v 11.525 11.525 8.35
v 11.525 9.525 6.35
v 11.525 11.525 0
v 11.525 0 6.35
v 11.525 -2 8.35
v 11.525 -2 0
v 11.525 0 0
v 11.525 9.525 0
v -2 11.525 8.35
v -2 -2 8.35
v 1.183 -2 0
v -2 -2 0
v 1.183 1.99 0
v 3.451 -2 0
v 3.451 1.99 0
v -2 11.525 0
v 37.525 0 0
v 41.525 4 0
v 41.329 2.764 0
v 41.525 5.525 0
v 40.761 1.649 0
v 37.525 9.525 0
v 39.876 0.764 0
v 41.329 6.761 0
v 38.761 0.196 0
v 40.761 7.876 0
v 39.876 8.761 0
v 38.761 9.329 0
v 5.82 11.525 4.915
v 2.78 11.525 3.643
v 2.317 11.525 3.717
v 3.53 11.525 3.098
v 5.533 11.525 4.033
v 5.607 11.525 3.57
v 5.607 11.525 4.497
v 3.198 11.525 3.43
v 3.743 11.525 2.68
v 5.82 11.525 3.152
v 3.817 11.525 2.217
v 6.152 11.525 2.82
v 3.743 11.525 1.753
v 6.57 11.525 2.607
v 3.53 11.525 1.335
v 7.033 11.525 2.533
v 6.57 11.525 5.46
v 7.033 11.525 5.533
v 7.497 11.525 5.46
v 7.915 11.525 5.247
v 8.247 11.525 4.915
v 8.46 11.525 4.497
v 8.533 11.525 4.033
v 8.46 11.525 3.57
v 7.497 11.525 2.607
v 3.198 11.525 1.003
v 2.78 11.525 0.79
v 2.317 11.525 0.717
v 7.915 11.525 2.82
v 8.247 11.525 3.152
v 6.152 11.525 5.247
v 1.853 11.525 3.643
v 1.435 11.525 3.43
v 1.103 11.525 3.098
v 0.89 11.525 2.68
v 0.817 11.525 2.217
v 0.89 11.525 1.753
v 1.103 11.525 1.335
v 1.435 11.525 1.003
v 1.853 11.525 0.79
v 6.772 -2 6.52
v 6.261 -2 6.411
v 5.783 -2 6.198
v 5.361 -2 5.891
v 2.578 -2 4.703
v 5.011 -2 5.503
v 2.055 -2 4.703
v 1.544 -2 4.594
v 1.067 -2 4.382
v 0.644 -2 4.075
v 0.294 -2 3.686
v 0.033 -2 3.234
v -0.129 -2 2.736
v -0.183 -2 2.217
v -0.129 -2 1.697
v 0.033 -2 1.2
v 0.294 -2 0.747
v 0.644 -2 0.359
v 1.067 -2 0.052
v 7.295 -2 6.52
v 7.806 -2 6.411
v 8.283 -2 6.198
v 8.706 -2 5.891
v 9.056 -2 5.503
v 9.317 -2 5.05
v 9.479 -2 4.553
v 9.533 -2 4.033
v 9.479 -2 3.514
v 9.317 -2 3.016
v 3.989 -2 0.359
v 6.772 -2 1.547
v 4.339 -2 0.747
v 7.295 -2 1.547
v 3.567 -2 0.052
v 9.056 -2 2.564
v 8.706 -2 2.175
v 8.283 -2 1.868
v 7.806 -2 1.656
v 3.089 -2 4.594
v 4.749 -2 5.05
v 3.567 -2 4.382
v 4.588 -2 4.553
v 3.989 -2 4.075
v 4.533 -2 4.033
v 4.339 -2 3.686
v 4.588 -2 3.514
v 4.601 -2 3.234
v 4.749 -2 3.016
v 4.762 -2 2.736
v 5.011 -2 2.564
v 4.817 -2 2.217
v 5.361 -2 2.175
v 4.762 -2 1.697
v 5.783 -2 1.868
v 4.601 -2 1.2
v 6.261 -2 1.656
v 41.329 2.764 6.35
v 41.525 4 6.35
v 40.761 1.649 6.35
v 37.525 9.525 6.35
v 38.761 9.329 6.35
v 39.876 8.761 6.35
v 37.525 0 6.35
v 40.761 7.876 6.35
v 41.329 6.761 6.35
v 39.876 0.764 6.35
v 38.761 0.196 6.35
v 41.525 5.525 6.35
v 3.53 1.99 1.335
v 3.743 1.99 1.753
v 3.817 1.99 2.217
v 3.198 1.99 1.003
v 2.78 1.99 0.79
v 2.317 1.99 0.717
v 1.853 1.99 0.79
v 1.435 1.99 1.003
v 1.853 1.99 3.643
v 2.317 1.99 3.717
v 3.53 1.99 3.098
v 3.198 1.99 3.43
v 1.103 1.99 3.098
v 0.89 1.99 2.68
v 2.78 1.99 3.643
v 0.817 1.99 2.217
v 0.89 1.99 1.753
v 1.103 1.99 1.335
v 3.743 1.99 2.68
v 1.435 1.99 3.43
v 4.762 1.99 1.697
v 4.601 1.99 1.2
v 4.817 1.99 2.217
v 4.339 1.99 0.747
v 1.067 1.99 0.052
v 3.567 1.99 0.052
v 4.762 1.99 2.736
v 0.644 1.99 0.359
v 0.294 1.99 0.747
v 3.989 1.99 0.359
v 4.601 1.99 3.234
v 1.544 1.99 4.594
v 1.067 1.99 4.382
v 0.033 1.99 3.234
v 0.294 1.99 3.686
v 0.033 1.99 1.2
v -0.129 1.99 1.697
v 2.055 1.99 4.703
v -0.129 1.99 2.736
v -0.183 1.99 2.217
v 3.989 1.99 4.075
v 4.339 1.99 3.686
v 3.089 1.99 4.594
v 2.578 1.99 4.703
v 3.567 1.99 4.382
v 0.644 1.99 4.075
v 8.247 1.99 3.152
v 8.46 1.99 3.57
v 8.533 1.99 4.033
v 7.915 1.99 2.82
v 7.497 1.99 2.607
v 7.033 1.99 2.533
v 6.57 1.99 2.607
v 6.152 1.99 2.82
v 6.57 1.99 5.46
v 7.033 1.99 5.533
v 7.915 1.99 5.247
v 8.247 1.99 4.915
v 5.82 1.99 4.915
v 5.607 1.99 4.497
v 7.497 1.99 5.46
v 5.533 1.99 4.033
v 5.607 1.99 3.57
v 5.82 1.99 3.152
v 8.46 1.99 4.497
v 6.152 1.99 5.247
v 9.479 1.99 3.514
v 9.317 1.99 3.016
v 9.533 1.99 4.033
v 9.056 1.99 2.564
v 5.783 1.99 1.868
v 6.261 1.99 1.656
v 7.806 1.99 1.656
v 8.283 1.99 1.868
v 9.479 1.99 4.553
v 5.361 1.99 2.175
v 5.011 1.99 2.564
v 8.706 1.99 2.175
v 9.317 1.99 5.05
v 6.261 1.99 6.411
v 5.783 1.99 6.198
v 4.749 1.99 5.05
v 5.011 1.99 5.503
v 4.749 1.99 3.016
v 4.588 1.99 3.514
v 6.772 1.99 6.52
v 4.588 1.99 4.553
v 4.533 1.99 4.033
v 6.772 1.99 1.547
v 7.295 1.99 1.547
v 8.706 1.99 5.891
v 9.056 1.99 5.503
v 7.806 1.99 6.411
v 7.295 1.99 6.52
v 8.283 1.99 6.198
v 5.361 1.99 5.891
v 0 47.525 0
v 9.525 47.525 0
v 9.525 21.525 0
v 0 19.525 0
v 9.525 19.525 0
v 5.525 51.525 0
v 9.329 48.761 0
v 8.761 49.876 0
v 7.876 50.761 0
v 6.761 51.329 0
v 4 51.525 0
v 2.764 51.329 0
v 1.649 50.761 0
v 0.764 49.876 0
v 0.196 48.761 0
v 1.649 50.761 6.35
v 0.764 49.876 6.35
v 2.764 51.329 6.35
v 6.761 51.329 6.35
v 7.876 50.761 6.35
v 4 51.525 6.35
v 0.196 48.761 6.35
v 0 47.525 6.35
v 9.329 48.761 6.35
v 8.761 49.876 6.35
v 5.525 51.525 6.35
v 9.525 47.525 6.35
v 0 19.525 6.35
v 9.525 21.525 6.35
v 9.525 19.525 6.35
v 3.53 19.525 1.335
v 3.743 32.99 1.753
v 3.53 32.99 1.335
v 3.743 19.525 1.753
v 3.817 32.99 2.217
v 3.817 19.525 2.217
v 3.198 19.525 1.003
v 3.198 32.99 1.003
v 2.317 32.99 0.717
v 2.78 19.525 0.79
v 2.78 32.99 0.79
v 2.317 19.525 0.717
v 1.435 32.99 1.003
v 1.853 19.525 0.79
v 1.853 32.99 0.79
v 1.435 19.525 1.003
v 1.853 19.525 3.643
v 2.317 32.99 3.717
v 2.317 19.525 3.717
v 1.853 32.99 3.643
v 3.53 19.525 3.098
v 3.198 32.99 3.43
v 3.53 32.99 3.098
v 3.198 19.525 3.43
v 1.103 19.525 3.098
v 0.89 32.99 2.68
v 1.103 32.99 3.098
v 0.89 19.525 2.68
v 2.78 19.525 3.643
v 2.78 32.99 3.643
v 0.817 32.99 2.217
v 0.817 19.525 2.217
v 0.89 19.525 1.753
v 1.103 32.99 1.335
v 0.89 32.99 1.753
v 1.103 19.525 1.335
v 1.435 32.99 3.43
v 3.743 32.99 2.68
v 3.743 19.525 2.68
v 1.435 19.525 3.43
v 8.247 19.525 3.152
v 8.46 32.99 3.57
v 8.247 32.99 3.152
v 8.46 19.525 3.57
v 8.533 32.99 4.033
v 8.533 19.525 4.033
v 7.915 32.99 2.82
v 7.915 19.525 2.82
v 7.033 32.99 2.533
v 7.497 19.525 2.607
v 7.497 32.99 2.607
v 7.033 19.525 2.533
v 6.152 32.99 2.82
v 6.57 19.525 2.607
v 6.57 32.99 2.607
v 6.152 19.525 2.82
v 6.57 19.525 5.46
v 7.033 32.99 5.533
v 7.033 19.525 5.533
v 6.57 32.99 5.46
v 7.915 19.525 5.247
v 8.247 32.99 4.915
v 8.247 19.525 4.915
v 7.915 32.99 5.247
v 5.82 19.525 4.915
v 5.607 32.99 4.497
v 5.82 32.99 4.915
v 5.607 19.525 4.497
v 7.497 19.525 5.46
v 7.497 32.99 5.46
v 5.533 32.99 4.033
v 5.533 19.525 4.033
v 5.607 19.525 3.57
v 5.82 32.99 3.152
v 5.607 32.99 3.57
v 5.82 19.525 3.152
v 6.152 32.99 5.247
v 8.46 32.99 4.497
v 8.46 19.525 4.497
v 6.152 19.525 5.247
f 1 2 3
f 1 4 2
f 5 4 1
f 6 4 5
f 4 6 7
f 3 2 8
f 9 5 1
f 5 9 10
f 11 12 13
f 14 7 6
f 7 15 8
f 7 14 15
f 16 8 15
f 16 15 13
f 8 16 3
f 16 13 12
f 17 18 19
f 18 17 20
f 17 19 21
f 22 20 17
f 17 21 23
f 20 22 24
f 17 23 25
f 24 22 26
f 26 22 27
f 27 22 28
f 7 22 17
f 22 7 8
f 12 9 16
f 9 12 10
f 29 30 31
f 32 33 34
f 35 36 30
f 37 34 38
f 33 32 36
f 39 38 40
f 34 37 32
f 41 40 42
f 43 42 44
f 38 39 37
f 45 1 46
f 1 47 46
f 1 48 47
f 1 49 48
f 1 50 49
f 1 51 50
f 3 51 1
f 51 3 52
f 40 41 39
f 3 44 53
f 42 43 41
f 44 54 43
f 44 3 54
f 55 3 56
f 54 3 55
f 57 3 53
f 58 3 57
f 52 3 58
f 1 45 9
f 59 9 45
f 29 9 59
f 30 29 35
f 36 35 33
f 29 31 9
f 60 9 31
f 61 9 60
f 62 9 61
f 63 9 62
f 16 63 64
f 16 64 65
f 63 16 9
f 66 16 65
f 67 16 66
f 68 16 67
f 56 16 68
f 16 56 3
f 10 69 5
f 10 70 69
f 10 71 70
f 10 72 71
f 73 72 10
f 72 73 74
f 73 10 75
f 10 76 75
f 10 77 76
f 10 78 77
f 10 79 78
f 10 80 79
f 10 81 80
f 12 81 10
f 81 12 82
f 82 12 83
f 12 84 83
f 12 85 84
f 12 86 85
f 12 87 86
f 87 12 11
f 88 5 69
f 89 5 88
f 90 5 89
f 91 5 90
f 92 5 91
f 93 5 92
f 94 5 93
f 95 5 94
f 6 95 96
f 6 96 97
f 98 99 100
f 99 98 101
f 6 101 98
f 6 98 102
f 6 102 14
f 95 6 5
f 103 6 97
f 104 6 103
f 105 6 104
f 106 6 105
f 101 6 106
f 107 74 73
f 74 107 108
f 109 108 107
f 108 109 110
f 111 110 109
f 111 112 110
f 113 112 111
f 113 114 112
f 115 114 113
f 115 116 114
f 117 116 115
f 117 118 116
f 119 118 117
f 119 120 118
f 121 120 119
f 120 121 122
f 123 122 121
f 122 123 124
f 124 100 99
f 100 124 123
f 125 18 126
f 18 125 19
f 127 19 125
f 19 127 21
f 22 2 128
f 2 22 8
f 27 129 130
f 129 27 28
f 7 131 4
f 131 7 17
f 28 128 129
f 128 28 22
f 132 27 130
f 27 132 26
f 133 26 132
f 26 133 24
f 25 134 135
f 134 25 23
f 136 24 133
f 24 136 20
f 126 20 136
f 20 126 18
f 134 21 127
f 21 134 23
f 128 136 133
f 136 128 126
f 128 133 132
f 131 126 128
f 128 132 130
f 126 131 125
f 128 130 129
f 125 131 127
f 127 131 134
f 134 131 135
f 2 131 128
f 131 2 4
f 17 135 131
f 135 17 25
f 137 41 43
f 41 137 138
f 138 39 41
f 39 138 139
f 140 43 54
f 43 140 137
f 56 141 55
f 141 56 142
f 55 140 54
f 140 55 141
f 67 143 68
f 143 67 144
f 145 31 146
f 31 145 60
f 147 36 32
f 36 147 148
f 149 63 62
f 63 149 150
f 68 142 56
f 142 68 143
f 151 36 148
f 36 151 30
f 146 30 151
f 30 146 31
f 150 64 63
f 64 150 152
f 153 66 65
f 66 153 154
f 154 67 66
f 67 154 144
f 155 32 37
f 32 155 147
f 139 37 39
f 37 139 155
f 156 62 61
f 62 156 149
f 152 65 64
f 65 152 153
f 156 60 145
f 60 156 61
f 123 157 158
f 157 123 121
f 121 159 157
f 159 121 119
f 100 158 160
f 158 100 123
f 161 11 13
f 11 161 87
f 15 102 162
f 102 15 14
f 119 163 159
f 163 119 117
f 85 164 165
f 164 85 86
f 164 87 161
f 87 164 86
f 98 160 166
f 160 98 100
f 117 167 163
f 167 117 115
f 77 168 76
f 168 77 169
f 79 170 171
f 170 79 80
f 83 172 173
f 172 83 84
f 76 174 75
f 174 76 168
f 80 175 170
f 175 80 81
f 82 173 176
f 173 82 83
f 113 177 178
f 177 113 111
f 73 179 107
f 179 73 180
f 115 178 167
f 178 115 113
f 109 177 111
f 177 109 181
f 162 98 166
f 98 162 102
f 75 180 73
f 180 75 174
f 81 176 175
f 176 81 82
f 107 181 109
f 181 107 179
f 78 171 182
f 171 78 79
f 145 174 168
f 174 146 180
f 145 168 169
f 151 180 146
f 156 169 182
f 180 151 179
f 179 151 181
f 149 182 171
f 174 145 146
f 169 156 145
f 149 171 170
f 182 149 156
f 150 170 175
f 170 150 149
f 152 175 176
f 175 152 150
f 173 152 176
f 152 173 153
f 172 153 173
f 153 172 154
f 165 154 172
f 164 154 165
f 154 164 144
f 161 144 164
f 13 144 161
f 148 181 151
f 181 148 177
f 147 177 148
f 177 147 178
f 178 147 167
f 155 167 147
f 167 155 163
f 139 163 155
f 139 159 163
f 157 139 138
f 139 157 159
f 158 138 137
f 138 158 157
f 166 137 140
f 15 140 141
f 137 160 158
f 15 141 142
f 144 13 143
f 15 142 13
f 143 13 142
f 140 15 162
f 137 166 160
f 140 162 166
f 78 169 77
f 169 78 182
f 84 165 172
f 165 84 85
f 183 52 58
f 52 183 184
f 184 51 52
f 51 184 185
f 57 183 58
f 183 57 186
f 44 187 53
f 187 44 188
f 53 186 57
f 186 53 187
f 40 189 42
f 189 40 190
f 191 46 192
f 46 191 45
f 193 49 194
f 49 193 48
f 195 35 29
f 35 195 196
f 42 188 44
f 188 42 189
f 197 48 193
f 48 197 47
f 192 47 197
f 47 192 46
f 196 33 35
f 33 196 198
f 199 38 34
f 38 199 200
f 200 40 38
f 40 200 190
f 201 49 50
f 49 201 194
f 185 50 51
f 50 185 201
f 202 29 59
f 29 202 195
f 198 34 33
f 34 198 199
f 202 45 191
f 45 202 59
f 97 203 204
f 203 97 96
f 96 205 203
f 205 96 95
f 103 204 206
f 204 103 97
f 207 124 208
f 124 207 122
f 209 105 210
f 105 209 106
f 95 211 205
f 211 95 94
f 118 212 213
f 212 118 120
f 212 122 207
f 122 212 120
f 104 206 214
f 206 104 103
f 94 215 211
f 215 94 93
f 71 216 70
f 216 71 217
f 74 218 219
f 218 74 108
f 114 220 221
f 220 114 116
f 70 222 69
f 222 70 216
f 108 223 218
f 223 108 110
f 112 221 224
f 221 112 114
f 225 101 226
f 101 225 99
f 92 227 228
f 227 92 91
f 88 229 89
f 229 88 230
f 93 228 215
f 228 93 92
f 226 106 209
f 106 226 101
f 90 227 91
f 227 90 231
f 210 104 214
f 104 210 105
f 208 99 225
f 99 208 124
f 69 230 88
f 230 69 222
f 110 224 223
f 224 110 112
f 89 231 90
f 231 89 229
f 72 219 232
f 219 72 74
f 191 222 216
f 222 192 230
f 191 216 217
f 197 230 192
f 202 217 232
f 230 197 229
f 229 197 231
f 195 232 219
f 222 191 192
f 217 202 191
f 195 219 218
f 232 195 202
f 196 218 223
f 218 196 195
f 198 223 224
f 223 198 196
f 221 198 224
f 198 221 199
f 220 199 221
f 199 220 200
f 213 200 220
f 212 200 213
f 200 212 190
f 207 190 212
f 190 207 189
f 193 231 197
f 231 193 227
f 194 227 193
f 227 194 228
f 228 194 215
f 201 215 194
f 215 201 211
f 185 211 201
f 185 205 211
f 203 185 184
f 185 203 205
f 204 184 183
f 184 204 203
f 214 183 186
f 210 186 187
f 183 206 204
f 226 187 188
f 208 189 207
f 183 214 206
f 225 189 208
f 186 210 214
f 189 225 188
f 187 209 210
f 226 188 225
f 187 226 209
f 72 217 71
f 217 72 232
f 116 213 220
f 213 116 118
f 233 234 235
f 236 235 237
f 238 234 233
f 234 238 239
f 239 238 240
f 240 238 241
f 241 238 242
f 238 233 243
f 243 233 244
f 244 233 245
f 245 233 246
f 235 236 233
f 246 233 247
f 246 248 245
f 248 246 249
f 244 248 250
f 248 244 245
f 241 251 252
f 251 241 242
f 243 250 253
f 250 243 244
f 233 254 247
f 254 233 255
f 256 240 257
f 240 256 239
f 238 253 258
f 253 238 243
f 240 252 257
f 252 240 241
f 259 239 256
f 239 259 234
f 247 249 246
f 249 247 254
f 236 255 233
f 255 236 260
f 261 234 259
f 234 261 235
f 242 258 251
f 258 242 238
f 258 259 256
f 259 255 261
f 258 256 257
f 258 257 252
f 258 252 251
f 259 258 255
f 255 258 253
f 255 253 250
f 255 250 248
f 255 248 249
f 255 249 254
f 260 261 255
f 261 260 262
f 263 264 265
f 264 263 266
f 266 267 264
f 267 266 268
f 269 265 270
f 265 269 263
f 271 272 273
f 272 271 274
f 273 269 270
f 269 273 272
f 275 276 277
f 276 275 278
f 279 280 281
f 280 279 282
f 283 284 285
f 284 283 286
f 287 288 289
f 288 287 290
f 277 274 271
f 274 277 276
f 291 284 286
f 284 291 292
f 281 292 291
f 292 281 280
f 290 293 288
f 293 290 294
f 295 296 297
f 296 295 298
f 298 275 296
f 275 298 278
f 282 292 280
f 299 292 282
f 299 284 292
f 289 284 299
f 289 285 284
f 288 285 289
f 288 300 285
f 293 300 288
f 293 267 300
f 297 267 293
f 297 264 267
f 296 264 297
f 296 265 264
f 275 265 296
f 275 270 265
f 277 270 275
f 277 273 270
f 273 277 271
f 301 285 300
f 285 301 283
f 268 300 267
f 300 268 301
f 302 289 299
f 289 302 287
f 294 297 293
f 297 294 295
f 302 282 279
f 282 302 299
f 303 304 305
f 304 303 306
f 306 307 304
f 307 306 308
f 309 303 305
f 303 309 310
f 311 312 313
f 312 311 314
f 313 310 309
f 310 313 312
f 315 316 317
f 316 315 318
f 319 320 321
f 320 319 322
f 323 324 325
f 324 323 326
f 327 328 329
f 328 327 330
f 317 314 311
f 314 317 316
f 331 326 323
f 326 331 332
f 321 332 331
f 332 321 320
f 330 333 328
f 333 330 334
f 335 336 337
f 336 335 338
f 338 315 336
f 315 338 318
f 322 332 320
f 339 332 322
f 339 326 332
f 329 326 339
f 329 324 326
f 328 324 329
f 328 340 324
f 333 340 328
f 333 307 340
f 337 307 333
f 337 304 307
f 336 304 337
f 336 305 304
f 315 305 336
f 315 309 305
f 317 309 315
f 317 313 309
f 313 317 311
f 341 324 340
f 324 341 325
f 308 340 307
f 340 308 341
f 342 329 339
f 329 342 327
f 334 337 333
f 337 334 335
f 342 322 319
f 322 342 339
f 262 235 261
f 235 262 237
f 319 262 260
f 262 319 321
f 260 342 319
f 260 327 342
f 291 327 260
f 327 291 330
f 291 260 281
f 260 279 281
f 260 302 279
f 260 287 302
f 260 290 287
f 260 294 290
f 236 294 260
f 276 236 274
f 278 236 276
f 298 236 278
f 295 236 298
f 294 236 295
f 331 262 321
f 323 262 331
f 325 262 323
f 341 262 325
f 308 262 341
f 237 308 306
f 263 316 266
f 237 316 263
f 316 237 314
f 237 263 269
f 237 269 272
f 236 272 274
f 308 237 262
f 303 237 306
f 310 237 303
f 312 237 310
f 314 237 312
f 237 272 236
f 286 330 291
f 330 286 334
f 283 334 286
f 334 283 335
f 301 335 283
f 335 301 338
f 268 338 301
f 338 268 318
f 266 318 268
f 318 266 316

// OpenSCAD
framing=25.4*(3/8);
fthick=25.4*(1/4);
tabdepth=30;
coffset=4;

intersection(){
  corner();
  translate([-5,coffset*-.5]) cube([50,framing+coffset,fthick+2]);
}
translate([0,10]) intersection(){
  corner();
  translate([0,framing]) cube([framing,50,fthick]);
}

module corner() {
  difference(){union(){
    translate([coffset*-.5,coffset*-.5]) cube([framing+coffset,framing+coffset,fthick+2]);
    translate([framing+coffset/2,0]) cube2([tabdepth,framing,fthick],rx=0);
    translate([0,framing+coffset/2]) cube2([framing,tabdepth,fthick],ry=0);
    }
    translate([0,coffset*-.5]) {
        translate([.2+fthick/3,-.01,.1+fthick/3]) rotate([-90,0]) {
        cylinder(d=3,h=tabdepth-5,$fn=20);
        cylinder(d=5,h=4,$fn=30);
      }
      translate([2.8+fthick*(2/3),-.01,fthick*(2/3)-.2]) rotate([-90,0]) {
        cylinder(d=3,h=tabdepth-5,$fn=20);
        cylinder(d=5,h=4,$fn=30);
      }
    }
  }
}

module cube2(dims,r=4,rx=1,ry=1)
{
  linear_extrude(dims[2]) {
    translate([rx?r:0,0]) square([dims[0]-(rx?r*2:r),dims[1]]);
    translate([0,ry?r:0]) square([dims[0],dims[1]-(ry?r*2:r)]);
    for(x=rx?[r,dims[0]-r]:[dims[0]-r],y=[r,dims[1]-r])
      translate([x,y]) circle(r=r,$fn=20);
  }
}
